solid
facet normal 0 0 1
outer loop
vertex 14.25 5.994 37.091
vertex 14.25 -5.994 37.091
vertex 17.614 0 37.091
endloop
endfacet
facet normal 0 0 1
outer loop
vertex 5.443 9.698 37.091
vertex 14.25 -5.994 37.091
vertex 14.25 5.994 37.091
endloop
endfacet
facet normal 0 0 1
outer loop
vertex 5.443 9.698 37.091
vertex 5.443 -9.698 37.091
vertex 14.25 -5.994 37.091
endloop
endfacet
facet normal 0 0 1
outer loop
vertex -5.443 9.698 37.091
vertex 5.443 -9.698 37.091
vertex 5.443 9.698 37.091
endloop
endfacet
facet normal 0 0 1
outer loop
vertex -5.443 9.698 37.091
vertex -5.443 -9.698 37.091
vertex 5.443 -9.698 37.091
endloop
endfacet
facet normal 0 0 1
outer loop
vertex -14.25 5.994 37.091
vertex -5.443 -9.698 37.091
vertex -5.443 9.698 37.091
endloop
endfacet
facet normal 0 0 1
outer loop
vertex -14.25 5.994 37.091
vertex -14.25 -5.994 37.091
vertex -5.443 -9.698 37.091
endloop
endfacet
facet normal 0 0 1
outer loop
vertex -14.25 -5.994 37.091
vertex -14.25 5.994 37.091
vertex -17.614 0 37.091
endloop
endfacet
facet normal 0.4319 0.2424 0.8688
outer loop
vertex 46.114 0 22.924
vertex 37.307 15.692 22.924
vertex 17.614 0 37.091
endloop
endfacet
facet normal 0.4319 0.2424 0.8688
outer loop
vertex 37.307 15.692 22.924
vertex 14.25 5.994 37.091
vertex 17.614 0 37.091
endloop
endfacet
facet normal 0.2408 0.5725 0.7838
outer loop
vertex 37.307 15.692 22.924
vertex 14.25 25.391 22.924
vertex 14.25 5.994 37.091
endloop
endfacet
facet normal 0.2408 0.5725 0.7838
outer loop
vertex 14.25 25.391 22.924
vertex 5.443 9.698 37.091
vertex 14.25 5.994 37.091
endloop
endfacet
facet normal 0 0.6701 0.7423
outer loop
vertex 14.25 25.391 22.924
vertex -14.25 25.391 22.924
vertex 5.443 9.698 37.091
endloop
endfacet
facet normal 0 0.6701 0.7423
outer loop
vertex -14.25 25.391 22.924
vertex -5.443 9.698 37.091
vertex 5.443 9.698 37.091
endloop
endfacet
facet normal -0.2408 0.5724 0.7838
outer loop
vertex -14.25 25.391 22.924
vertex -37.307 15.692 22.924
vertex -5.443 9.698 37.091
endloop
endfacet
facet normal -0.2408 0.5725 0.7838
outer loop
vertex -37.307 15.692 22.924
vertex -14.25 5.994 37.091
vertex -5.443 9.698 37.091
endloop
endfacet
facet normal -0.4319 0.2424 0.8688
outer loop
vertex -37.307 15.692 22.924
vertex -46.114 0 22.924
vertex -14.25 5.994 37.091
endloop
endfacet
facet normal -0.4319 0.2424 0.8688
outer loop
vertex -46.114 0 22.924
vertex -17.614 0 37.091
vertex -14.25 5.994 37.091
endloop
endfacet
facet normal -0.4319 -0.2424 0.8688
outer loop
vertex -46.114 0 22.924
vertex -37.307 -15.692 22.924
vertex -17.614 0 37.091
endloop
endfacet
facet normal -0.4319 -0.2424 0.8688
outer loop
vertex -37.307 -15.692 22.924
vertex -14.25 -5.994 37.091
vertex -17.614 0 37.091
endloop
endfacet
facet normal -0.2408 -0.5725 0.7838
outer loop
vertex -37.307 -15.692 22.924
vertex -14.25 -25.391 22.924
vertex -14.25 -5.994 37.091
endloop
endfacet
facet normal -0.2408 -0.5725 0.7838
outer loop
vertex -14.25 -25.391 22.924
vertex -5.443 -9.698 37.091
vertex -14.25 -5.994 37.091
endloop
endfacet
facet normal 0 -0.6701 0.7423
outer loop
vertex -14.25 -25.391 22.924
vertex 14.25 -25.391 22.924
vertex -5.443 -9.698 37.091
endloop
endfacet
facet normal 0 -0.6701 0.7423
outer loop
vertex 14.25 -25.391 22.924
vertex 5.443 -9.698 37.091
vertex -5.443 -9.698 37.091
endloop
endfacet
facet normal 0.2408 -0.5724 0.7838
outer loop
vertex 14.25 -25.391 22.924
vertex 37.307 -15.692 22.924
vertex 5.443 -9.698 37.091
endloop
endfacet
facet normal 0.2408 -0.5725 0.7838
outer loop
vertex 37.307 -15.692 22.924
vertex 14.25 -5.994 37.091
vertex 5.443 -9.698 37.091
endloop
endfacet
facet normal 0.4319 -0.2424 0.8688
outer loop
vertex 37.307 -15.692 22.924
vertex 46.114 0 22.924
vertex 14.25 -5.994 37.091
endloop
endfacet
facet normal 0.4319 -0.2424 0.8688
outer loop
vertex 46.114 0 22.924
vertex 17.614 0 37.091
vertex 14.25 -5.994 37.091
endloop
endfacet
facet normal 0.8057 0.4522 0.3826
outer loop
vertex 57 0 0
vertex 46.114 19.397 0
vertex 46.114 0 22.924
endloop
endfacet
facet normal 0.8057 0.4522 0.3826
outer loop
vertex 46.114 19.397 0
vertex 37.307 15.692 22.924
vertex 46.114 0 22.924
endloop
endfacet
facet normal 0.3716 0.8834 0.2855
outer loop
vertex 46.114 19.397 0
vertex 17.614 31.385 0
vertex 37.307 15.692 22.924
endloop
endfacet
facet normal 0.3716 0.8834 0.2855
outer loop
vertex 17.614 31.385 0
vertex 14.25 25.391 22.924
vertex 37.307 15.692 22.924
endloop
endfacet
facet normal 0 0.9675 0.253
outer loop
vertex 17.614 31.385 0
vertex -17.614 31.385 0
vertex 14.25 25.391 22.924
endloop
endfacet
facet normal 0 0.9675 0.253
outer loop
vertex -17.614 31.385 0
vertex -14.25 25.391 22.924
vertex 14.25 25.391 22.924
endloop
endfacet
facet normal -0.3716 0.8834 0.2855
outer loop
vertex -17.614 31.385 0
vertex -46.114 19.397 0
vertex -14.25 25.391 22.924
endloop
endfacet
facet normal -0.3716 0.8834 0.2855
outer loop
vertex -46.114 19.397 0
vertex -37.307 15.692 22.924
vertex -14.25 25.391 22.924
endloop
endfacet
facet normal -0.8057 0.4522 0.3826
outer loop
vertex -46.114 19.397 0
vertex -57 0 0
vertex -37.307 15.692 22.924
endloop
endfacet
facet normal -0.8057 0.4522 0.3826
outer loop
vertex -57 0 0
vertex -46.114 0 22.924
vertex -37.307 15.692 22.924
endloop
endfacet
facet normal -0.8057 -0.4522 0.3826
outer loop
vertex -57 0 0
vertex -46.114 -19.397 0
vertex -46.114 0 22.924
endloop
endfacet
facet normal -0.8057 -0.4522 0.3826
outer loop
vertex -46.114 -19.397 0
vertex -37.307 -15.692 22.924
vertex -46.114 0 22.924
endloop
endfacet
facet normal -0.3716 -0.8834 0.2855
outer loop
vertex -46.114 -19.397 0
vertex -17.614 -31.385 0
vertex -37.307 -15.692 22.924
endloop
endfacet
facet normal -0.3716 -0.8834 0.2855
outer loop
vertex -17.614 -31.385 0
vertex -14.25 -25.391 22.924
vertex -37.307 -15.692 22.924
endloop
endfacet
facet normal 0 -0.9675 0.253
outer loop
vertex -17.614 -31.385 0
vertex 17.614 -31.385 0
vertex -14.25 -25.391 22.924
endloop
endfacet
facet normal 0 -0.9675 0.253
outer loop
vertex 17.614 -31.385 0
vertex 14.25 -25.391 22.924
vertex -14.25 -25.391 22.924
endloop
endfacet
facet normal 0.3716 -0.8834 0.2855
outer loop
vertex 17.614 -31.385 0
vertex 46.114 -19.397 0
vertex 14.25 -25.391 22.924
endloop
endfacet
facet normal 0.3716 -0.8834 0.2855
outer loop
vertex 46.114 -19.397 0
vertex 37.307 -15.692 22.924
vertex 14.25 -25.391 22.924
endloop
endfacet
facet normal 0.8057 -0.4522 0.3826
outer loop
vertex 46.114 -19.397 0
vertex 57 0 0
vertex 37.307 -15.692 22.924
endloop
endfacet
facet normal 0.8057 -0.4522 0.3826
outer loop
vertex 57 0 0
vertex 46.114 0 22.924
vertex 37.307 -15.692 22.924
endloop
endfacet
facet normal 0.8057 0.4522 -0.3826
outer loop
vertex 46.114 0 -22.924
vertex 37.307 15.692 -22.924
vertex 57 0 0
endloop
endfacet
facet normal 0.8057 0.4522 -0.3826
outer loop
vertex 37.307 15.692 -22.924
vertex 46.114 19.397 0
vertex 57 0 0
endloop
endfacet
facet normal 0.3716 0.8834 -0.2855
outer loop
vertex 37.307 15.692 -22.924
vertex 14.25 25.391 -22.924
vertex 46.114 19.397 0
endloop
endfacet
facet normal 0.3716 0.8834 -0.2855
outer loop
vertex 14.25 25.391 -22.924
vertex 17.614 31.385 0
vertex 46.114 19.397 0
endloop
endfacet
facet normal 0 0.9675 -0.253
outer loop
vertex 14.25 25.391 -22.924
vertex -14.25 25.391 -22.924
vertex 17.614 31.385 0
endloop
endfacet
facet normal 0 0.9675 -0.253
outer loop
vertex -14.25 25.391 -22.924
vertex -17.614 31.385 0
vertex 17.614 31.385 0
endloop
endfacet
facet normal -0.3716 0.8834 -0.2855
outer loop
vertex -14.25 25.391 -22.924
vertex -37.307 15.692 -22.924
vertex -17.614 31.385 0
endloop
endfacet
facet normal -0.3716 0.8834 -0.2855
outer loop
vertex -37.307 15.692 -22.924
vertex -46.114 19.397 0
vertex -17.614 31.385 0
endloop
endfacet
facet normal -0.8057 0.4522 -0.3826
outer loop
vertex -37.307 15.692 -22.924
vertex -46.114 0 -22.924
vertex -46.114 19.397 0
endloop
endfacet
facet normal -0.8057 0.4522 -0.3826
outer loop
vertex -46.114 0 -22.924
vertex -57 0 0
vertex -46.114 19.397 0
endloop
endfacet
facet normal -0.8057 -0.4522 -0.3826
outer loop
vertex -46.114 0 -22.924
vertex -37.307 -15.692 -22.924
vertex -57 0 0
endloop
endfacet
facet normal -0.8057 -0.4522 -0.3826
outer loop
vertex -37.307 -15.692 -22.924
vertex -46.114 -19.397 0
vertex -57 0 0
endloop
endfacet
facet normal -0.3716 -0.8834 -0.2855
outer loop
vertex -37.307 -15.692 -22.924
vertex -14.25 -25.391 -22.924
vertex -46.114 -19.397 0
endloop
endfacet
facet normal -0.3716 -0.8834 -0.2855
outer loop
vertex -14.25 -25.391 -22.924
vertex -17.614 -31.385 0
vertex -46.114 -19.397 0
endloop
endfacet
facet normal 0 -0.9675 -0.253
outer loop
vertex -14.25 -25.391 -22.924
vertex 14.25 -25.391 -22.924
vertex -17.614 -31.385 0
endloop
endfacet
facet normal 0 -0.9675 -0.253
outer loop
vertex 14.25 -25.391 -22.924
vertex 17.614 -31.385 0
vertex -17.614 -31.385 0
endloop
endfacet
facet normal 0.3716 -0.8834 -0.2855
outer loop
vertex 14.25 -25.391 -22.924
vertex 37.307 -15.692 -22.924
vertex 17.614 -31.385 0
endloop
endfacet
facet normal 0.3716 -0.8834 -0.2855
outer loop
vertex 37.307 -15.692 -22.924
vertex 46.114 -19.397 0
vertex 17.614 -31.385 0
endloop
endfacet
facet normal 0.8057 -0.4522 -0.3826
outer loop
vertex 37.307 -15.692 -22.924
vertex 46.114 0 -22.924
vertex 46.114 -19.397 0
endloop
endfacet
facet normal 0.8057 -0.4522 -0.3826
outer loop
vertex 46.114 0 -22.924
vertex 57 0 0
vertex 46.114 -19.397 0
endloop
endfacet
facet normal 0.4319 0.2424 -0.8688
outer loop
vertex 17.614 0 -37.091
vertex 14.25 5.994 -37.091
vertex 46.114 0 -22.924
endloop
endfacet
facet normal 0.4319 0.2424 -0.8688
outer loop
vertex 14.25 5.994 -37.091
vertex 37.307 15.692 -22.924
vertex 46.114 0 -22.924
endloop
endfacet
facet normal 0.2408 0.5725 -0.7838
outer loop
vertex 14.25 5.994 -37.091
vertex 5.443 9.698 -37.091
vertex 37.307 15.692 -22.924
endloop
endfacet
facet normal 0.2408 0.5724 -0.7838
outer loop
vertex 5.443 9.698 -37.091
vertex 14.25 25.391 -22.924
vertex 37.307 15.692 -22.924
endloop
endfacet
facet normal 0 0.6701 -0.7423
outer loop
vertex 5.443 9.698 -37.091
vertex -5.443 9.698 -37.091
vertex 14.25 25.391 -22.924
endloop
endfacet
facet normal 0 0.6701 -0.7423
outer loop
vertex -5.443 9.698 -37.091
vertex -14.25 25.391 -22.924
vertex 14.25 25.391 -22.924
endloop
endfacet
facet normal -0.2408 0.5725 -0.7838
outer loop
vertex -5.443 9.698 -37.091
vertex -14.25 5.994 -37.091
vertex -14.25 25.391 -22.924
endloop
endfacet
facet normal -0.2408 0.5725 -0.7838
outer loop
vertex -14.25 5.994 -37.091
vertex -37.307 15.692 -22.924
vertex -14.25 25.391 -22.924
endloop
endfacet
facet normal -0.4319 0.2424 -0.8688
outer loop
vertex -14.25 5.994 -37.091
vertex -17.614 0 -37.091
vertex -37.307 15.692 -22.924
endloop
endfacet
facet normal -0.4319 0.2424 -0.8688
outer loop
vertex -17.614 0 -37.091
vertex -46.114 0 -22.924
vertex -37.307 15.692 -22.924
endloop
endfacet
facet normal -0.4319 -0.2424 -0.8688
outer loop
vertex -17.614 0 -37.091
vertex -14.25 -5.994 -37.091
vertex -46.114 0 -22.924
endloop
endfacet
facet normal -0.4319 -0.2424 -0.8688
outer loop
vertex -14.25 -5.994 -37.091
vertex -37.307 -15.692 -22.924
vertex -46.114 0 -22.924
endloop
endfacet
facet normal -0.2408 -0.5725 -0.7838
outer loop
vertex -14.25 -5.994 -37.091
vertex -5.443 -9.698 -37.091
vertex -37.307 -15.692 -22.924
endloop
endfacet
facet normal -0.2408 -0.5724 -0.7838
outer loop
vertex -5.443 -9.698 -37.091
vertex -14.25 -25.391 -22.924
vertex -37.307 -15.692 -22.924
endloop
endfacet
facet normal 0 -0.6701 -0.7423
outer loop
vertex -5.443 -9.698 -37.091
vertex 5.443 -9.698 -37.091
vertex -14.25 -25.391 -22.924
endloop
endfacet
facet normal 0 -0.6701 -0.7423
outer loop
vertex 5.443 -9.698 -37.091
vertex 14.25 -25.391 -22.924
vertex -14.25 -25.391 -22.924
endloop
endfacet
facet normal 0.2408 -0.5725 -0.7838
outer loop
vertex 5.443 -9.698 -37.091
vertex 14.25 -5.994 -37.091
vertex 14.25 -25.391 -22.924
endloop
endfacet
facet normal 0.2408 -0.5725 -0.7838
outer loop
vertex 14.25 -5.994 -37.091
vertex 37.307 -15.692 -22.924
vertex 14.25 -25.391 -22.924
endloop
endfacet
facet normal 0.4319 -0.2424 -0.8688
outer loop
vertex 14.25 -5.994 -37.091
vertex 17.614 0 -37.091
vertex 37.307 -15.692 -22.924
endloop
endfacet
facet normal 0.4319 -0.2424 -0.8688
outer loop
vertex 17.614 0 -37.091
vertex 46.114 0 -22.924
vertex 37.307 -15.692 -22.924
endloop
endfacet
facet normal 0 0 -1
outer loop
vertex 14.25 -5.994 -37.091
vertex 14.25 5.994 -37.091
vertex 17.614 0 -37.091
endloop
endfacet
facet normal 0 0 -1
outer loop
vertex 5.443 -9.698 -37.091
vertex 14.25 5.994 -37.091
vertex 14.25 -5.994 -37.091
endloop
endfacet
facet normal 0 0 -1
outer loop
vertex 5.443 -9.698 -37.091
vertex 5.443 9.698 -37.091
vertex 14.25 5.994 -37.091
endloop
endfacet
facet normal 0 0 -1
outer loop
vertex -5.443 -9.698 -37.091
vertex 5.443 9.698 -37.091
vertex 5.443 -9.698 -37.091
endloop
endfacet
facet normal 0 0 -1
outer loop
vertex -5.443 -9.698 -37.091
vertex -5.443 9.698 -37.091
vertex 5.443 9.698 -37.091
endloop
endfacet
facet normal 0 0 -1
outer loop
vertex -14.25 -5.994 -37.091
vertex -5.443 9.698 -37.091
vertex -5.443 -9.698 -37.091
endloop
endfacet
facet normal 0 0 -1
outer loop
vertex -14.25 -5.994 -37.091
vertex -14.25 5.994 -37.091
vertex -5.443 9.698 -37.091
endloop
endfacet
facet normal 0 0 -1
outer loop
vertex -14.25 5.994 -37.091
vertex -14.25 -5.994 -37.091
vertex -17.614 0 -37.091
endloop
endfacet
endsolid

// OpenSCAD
// Generated by SolidPython 1.0.1 on 2020-07-29 00:46:54


scale(v = [19, 11, 13]) {
	sphere(r = 3);
}
/***********************************************
*********      SolidPython code:      **********
************************************************
 
# import packages: SolidPython
from solid import *
from solid.utils import *
from itertools import chain, combinations, permutations


class Resize:

    def __init__(self, scad_file):
        self.scad_file = scad_file
        #self.scad_file = import_scad(scad_file)
        # cone/cylinder param:
        self.r1 = 0
        self.r2 = 0
        self.h = 0
        # rectangular prism param:
        self.w = 0
        self.l = 0
        # ellipse param:
        self.r = 0

    # import OpenScad code (file name corresponds to shape)


    # classify shape + parameters
    def assign(self, param1, param2, param3):
        if self.scad_file == 'cone.scad':
            self.r1 = param1
            self.r2 = param2
            self.h = param3
        elif self.scad_file == 'cylinder.scad':
            self.r1 = param1
            self.r2 = param2
            self.h = param3
        elif self.scad_file == 'rectangularPrism.scad':
            self.h = param1
            self.l = param2
            self.w = param3
        else:
            self.r = param1
            self.h = param2

    # resize parameters
    def iterate(self):
        x = range(3, 20, 2)
        i = 1
        if self.scad_file == 'cone.scad':
            tempList = list(permutations(x, 2))
            for temp in tempList:
                param1 = temp[0]
                param2 = temp[1]
                filepath = 'produced_scad_files/' + 'cone' + str(param1) + '_' + str(param2) + '_' + '.scad'
                scad_render_to_file(cylinder(h=param1, r1=param2, r2=0), filepath)

        elif self.scad_file == 'cylinder.scad':
            tempList = list(permutations(x, 3))
            for temp in tempList:
                param1 = temp[0]
                param2 = temp[1]
                filepath = 'produced_scad_files/' + 'cylinder' + str(param1) + '_' + str(param2) + '_' + '.scad'
                scad_render_to_file(cylinder(h=param1, r1=param2, r2=param2), filepath)

        elif self.scad_file == 'rectangularPrism.scad':
            tempList = list(permutations(x, 3))
            for temp in tempList:
                param1 = temp[0]
                param2 = temp[1]
                param3 = temp[2]
                filepath = 'produced_scad_files/' + 'rectangularPrism' + str(param1) + '_' + str(param2) + '_' + str(
                    param3) + '.scad'
                scad_render_to_file(cube(size=(param1, param2, param3)), filepath)

        elif self.scad_file == 'ellipse.scad':
            tempList = list(permutations(x, 4))
            for temp in tempList:
                param1 = temp[0]
                param2 = temp[1]
                param3 = temp[2]
                param4 = temp[3]
                filepath = 'produced_scad_files/' + 'ellipse' + str(param1) + '_' + str(param2) + '_' + str(param3) + '_' + str(param4) + '.scad'
                scad_render_to_file(scale([param1, param2, param3])(sphere(r=param4)), filepath)

    def render_to_scadfile(self):
        scad_render_to_file(scad, 'example.scad') 
 
************************************************/
